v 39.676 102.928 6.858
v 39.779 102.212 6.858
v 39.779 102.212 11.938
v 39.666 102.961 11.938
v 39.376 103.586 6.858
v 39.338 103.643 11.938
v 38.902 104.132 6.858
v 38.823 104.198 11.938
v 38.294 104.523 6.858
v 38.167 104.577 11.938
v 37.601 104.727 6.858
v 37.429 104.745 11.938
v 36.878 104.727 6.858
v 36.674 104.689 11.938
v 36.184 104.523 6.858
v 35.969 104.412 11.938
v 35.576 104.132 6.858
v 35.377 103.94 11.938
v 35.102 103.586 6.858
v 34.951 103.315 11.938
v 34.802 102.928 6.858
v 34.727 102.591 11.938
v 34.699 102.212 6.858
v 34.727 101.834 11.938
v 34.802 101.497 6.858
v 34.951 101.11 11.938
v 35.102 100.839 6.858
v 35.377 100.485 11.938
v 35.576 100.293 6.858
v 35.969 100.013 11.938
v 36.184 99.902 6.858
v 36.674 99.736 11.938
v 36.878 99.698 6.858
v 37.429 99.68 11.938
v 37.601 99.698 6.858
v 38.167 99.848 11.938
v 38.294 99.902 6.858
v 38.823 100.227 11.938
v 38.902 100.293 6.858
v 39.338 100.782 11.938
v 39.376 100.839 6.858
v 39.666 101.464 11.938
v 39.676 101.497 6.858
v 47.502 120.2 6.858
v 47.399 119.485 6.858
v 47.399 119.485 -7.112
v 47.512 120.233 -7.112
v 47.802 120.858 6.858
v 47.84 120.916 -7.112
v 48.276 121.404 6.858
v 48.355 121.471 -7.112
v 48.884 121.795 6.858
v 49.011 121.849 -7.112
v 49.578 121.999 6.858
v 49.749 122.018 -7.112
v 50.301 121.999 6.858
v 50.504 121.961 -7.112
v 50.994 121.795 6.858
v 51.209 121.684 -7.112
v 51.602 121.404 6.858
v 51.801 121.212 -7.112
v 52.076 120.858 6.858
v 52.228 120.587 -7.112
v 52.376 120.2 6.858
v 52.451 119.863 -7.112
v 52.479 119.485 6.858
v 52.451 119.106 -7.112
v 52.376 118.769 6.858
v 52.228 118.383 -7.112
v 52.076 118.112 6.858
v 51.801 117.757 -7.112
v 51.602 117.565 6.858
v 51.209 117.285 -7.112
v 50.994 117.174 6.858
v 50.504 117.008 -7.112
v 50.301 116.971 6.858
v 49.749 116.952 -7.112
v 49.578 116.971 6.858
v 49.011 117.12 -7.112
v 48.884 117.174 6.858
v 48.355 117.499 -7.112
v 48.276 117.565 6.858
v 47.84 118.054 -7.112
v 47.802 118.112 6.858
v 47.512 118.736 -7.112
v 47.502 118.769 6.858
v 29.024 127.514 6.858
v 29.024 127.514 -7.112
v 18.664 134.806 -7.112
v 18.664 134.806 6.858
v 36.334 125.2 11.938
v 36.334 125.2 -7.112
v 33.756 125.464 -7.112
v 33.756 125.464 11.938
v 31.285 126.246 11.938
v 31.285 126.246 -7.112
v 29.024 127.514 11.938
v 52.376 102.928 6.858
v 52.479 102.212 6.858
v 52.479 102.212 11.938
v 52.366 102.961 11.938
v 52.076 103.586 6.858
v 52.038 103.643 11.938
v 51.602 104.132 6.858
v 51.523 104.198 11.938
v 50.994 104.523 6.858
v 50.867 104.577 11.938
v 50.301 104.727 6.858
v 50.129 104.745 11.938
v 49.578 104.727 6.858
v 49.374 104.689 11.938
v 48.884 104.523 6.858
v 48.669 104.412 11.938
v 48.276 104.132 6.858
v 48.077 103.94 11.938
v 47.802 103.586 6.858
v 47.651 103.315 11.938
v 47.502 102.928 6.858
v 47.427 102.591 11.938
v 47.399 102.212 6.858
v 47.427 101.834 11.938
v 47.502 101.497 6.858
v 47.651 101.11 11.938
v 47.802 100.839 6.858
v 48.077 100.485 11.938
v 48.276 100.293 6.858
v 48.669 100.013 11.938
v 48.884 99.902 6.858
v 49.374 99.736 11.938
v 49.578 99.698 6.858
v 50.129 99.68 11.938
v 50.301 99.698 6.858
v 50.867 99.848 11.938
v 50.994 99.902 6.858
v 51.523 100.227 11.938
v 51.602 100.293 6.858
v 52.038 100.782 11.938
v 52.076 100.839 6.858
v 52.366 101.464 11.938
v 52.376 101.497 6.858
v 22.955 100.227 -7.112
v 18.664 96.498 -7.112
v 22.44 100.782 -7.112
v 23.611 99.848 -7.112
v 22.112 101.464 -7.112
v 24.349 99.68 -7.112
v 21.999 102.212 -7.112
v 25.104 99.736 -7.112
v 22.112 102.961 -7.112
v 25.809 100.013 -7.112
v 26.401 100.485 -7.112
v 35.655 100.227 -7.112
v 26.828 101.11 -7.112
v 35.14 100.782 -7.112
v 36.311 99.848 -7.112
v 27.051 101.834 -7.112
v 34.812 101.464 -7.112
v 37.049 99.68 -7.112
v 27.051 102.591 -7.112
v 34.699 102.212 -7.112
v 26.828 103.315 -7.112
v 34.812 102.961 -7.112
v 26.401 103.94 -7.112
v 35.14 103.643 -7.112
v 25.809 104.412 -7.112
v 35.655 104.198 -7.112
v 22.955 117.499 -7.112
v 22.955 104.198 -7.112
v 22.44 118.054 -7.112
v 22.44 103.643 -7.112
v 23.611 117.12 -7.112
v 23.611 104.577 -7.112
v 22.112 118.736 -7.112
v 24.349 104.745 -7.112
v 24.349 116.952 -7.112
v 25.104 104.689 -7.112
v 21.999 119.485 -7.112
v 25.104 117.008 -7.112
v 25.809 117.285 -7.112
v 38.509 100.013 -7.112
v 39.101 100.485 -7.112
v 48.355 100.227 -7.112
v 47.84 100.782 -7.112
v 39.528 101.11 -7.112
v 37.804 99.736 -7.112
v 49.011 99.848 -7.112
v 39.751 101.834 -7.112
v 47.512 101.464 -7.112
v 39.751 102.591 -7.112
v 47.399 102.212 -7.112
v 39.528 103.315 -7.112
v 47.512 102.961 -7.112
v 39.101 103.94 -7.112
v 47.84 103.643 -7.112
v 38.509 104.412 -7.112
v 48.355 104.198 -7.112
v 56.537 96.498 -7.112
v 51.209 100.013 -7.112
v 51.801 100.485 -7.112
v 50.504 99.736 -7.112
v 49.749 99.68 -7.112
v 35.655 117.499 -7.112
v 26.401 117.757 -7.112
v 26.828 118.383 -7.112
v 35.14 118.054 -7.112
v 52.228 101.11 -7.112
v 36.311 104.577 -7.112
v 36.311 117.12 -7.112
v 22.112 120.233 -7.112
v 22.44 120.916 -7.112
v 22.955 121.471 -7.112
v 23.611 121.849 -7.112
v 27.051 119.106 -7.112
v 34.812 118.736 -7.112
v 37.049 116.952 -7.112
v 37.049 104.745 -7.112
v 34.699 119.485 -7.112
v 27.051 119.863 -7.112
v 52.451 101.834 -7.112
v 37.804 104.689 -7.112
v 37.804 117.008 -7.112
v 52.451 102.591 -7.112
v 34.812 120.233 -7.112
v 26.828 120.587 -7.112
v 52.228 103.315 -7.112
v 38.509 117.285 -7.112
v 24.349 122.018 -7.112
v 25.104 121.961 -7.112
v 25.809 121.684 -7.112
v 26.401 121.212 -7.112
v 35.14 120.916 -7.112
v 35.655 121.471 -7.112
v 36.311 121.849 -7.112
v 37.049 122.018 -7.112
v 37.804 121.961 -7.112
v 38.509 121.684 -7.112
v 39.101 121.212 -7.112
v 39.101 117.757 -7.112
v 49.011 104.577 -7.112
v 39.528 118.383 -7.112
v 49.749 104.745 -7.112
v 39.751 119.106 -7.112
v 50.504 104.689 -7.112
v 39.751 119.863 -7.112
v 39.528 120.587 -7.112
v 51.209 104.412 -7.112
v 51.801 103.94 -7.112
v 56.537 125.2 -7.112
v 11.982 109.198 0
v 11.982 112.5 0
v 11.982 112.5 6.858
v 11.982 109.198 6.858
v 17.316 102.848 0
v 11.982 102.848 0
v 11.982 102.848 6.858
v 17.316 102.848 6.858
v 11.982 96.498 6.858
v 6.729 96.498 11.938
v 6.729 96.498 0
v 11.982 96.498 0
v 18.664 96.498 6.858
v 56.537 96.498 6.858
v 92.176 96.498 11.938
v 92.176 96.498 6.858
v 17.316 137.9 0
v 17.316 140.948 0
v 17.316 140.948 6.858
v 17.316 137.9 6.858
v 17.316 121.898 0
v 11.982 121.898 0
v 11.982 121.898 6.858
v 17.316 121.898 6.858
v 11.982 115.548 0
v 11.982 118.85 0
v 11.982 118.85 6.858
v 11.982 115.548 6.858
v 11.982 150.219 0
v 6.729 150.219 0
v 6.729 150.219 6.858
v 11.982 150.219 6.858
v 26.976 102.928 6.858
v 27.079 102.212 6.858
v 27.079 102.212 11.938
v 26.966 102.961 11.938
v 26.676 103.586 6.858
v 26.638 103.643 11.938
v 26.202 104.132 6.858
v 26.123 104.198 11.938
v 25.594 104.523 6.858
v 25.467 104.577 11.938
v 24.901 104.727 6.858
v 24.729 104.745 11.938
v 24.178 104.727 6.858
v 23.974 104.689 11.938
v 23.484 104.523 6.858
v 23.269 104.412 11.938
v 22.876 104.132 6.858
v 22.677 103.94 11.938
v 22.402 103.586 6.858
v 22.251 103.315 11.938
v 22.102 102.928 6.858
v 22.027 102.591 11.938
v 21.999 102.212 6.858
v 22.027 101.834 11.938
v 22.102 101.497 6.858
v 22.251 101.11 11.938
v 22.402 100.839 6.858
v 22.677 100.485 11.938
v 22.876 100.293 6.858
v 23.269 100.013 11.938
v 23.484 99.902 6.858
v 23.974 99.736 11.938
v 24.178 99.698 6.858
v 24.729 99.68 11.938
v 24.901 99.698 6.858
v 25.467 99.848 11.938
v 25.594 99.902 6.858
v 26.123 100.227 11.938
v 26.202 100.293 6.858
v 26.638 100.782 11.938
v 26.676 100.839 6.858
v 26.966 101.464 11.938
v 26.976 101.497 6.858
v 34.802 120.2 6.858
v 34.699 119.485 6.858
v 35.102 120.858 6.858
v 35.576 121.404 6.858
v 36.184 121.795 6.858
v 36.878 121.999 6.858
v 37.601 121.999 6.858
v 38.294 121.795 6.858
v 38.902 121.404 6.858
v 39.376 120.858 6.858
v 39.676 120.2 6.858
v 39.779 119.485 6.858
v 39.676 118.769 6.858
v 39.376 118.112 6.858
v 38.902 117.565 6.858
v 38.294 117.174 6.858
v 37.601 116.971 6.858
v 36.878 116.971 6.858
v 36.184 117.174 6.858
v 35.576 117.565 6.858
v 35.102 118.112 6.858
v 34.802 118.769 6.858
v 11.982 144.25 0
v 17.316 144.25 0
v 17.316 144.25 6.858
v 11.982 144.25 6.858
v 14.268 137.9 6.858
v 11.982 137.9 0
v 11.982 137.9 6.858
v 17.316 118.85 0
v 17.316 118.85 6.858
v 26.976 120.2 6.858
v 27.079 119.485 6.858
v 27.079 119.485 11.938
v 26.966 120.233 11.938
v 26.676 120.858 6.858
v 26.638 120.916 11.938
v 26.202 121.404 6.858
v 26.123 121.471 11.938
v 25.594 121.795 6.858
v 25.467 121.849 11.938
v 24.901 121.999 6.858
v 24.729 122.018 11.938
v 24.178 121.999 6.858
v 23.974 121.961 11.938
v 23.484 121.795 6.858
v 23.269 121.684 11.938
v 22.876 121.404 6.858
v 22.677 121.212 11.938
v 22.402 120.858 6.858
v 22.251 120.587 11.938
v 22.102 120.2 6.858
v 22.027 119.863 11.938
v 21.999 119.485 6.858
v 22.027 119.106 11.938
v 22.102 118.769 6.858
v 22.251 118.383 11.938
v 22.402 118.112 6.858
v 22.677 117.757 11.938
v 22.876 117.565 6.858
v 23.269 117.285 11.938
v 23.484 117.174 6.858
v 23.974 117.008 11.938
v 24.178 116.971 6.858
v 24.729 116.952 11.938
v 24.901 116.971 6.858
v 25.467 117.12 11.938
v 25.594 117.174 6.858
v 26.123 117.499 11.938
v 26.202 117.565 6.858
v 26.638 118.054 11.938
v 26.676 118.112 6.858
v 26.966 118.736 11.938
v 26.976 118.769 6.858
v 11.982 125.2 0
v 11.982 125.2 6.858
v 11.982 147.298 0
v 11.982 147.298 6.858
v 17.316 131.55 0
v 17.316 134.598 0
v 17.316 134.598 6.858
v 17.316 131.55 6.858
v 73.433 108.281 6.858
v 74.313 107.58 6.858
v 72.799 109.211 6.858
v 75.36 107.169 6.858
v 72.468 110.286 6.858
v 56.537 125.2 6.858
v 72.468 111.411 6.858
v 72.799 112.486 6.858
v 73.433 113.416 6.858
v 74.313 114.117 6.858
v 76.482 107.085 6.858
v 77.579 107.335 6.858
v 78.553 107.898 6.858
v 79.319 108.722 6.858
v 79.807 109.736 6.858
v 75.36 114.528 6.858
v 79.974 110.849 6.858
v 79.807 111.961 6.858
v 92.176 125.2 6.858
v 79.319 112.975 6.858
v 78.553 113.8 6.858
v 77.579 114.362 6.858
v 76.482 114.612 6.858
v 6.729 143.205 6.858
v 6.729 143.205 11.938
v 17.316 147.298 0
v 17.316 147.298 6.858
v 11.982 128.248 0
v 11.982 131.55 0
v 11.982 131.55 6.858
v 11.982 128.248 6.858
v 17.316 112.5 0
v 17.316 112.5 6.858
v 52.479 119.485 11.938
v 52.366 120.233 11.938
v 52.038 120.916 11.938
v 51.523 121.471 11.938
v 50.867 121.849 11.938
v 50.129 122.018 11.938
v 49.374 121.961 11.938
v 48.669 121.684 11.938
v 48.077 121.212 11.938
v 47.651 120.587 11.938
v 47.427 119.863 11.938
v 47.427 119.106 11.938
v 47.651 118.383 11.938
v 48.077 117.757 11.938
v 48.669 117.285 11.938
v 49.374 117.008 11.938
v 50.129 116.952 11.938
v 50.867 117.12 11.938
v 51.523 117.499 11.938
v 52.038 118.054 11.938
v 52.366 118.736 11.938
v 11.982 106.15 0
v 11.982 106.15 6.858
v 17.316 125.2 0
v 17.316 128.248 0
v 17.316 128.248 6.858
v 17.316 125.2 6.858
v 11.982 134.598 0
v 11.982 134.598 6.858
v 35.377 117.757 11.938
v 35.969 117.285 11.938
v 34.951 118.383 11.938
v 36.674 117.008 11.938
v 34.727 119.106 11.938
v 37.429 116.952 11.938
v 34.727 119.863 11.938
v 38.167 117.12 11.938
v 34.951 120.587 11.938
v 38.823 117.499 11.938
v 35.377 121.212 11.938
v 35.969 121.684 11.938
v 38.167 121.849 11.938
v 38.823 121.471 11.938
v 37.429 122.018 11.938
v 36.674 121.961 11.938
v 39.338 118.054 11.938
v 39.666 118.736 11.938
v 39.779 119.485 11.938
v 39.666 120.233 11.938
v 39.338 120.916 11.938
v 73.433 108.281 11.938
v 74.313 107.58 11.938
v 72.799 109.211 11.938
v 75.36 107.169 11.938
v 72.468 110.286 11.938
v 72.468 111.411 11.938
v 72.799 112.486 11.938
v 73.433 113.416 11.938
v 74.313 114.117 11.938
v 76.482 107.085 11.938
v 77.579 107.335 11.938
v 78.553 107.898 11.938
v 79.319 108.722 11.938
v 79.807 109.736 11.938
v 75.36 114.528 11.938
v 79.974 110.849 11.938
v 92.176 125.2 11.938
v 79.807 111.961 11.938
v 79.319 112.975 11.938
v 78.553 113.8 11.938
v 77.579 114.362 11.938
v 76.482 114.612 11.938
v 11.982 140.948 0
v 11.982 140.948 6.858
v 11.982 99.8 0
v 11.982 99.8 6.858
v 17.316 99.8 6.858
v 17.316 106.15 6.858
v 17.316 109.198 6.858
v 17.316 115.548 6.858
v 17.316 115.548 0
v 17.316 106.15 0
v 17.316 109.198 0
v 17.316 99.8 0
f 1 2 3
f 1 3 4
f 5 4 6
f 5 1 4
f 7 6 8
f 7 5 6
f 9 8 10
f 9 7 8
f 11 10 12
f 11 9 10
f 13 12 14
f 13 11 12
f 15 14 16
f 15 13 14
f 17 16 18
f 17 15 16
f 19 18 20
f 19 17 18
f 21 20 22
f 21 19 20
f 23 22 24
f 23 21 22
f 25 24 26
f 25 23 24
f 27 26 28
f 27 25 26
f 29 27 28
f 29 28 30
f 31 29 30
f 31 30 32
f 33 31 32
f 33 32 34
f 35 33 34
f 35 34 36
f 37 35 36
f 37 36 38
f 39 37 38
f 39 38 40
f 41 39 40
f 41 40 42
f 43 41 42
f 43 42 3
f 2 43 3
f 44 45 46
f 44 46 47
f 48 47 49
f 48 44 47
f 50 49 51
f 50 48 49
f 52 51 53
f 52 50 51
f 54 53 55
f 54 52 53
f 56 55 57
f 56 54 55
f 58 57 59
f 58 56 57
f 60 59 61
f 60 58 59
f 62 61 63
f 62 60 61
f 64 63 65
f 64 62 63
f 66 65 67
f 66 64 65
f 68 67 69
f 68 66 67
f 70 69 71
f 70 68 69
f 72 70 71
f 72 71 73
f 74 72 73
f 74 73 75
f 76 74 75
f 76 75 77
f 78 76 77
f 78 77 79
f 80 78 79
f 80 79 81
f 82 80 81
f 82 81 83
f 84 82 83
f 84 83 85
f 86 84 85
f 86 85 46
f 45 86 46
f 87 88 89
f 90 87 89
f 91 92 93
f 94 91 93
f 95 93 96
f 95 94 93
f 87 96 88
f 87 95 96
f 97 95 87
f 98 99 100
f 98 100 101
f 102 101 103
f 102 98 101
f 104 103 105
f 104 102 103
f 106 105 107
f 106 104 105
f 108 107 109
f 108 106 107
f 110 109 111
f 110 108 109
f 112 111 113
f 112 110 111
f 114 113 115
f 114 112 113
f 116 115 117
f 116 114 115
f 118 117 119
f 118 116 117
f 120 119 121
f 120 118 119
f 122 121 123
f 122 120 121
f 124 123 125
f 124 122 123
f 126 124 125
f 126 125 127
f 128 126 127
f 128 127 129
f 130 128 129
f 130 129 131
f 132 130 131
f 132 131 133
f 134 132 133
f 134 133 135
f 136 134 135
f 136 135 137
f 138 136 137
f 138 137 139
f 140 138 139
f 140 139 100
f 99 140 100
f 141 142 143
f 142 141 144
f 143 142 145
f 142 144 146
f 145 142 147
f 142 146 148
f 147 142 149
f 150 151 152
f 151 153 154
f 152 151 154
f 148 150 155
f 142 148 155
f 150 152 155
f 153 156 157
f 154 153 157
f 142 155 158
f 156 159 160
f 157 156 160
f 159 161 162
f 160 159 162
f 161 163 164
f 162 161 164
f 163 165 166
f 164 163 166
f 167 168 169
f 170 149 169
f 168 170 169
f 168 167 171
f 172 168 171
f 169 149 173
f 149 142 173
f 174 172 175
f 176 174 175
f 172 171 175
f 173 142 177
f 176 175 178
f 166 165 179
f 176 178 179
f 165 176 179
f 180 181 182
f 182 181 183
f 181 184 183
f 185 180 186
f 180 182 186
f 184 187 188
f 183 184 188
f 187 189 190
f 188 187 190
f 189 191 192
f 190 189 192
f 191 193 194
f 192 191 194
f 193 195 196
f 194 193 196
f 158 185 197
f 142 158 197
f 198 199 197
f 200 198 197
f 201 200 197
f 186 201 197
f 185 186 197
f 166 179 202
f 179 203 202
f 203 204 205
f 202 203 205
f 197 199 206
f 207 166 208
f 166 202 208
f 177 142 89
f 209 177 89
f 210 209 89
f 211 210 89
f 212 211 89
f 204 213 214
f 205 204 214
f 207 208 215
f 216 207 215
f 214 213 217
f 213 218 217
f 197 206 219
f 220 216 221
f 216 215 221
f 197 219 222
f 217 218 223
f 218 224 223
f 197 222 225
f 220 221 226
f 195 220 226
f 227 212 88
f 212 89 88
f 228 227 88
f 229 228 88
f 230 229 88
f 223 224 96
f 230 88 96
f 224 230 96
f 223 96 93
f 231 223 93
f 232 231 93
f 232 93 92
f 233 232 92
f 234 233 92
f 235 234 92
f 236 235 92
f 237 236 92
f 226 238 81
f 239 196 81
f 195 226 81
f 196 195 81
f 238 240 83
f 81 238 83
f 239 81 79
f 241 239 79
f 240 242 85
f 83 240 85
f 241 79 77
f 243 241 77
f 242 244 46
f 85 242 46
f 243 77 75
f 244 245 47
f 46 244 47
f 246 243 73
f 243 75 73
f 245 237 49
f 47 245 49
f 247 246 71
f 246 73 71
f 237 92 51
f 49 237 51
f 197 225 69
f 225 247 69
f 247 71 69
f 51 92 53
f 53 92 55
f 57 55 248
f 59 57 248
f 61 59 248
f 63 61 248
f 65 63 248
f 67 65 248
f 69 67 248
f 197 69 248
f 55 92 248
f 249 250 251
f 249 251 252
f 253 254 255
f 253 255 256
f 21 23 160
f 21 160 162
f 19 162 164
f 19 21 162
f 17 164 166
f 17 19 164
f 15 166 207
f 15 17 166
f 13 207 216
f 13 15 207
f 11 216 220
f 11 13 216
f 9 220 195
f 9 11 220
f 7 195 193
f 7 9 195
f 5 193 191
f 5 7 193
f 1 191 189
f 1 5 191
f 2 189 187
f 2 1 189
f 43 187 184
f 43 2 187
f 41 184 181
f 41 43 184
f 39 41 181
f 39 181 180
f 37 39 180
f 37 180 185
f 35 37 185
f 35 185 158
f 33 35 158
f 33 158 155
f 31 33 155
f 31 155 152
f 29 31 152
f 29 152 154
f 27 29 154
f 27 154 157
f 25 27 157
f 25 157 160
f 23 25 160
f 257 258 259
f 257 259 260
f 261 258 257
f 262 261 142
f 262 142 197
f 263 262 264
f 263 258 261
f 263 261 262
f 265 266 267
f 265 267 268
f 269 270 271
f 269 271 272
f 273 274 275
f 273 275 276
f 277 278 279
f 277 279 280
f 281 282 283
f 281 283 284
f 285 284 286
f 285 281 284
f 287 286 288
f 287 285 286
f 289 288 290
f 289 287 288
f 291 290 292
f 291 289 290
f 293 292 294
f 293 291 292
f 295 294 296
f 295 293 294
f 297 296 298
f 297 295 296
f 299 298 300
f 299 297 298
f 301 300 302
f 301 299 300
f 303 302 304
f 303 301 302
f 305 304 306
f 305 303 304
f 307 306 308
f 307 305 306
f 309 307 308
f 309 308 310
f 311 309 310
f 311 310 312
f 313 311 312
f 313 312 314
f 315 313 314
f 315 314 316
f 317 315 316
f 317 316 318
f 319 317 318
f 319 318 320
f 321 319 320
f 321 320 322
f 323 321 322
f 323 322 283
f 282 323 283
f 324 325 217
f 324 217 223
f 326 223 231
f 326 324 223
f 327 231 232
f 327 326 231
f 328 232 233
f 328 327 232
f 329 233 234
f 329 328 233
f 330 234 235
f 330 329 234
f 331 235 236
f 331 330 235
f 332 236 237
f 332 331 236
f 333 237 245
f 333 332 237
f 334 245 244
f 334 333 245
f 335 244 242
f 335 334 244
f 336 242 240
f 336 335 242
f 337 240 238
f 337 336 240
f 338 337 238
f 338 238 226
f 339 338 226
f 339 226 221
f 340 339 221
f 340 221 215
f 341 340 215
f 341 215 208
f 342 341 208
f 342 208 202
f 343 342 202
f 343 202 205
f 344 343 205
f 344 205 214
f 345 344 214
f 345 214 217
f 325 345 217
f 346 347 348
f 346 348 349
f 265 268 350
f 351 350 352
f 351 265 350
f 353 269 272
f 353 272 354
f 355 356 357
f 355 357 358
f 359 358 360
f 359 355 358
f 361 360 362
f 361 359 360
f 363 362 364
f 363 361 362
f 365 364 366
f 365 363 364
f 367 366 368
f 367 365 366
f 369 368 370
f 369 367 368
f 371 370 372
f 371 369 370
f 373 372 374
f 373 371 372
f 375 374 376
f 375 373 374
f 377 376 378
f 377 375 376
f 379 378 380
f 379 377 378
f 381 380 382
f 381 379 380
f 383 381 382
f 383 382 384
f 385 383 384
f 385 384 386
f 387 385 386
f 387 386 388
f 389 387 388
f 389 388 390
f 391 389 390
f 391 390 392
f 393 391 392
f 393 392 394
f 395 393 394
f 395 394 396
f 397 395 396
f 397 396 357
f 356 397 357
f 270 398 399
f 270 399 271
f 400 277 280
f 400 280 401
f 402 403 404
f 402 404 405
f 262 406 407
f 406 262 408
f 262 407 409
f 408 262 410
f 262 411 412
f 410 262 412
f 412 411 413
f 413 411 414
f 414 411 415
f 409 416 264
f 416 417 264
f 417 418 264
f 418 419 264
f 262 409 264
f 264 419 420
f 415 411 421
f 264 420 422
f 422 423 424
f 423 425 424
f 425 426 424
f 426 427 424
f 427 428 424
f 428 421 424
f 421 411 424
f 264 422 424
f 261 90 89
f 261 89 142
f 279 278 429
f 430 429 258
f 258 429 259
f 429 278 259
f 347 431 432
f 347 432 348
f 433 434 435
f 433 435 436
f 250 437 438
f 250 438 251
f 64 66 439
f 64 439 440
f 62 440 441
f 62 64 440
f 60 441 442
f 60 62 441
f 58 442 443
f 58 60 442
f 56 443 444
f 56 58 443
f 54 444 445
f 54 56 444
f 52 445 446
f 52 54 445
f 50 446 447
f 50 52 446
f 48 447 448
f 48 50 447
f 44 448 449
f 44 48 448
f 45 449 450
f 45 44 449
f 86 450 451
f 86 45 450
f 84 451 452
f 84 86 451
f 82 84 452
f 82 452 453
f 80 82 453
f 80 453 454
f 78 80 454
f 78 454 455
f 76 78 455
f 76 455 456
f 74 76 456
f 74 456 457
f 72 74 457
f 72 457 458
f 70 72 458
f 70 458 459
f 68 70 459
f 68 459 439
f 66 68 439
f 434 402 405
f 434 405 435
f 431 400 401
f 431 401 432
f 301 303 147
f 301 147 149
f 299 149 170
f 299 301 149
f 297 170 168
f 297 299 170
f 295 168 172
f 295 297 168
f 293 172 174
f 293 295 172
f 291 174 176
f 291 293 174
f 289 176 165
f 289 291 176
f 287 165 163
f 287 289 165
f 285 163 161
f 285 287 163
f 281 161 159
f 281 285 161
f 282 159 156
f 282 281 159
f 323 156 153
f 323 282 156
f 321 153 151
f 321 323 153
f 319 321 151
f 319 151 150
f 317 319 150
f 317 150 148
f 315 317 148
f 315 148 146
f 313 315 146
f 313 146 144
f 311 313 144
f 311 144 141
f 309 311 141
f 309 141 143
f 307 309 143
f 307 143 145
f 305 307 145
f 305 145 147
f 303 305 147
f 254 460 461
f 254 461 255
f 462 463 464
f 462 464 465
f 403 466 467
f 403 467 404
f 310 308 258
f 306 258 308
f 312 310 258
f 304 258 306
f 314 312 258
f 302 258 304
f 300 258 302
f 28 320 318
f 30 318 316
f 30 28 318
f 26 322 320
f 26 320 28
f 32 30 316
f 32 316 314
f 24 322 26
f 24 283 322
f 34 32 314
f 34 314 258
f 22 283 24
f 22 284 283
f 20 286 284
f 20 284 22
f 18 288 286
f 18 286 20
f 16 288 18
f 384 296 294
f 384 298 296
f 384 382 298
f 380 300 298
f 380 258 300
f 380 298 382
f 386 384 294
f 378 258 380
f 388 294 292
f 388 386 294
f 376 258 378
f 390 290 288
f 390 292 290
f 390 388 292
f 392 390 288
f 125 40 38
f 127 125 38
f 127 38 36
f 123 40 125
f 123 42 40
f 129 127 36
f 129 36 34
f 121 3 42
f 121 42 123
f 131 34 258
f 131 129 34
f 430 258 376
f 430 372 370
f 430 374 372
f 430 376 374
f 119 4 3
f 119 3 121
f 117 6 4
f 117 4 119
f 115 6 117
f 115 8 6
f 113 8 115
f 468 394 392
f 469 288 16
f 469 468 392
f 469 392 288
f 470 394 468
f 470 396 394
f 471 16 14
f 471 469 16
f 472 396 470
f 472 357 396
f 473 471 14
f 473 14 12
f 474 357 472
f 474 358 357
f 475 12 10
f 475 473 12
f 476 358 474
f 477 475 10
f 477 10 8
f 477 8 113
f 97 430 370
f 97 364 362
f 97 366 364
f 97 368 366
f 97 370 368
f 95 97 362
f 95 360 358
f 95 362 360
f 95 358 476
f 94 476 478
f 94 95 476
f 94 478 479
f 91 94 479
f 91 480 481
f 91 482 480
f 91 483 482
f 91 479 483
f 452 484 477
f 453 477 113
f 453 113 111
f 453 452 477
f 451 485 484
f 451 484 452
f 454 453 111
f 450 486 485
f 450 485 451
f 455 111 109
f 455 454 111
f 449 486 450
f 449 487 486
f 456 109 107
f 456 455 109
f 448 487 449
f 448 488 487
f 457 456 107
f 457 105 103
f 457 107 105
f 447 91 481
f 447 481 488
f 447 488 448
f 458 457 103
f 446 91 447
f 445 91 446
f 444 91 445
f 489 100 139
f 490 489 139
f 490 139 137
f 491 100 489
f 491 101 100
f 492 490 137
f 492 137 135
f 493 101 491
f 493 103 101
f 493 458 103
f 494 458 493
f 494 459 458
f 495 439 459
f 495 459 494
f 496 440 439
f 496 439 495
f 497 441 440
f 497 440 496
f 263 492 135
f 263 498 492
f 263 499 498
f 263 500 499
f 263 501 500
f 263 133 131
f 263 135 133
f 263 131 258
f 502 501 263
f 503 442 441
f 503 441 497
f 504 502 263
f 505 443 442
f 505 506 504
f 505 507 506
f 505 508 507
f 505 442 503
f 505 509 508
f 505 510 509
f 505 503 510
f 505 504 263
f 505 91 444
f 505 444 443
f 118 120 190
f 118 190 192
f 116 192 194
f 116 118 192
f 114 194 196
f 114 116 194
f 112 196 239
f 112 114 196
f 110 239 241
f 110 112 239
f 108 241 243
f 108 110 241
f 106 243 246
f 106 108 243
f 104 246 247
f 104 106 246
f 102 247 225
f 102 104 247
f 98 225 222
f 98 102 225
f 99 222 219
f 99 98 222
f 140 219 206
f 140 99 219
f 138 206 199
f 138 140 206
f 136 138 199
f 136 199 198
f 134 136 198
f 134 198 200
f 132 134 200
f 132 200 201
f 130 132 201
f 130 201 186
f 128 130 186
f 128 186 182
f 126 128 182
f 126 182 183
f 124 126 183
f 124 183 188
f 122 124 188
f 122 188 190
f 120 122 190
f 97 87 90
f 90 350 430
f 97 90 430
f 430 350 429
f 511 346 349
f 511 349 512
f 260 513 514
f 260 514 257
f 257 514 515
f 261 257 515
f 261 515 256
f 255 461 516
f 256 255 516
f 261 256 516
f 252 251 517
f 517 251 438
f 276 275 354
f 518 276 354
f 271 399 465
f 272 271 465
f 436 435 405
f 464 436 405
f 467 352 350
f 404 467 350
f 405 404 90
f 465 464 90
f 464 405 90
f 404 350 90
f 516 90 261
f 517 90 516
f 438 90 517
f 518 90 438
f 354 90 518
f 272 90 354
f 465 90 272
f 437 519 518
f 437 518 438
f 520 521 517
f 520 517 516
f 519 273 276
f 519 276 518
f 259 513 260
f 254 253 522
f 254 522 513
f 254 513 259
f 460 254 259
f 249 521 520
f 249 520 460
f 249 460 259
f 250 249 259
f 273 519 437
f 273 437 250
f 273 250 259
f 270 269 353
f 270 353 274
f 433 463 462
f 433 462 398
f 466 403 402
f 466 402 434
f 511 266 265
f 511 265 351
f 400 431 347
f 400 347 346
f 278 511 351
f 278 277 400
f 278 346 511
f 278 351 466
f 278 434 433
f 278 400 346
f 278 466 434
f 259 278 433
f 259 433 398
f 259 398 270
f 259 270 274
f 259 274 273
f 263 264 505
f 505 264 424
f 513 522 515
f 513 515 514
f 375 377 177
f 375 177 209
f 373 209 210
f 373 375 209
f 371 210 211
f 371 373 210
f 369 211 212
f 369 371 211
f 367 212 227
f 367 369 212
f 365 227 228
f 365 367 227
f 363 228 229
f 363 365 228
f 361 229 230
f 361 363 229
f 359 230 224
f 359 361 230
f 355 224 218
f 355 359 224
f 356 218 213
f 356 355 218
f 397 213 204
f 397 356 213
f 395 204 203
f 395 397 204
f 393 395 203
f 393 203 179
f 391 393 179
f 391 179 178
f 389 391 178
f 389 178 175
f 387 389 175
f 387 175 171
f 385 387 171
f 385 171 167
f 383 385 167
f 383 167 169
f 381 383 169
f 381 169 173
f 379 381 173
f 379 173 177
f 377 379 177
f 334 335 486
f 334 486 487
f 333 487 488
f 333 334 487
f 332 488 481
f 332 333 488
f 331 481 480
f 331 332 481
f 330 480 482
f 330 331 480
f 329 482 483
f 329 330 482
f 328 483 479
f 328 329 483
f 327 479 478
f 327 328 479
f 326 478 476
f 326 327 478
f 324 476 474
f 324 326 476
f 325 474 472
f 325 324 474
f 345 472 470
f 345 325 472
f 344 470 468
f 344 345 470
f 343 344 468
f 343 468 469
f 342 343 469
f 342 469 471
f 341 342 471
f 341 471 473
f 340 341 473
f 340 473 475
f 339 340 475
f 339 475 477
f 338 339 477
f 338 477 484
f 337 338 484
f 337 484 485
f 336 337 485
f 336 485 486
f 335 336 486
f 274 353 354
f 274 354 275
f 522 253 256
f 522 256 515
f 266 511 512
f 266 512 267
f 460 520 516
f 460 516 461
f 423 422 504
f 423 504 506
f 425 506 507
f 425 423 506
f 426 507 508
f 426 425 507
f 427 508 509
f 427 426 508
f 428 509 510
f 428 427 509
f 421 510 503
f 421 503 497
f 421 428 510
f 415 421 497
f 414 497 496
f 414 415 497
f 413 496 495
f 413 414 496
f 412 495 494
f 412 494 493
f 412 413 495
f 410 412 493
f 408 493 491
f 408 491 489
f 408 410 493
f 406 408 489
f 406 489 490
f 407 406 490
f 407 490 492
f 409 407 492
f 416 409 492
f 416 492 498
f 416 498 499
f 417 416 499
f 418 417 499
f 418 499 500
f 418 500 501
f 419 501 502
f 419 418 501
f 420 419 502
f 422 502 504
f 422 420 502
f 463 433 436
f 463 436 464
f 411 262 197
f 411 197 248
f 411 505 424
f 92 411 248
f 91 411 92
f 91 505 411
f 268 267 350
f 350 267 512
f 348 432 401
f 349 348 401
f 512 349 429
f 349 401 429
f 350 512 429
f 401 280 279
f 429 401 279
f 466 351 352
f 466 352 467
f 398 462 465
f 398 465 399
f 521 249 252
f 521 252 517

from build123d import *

# Parameters (mm, degrees)
BOSS_EXTRUDE1_DEPTH = 6.858
SKETCH3_R           = 2.54
SKETCH3_R_2         = 3.77436477
BOSS_EXTRUDE2_DEPTH = 5.08
SKETCH4_R           = 2.54
BOSS_EXTRUDE3_DEPTH = 13.97


with BuildPart() as part:
    # Sketch2 → Boss-Extrude1 (new body)
    with BuildSketch(Plane.XY):
        Polygon((11.982344641, 125.199618103), (11.982344641, 121.897618103), (17.316344641, 121.897618103), (17.316344641, 118.849618103), (11.982344641, 118.849618103), (11.982344641, 115.547618103), (17.316344641, 115.547618103), (17.316344641, 112.499618103), (11.982344641, 112.499618103), (11.982344641, 109.197618103), (17.316344641, 109.197618103), (17.316344641, 106.149618103), (11.982344641, 106.149618103), (11.982344641, 102.847618103), (17.316344641, 102.847618103), (17.316344641, 99.799618103), (11.982344641, 99.799618103), (11.982344641, 96.497618103), (6.729436841, 96.497618103), (6.729436841, 125.199618103), (6.729436841, 150.218618103), (11.982344641, 150.218618103), (11.982344641, 147.297618103), (17.316344641, 147.297618103), (17.316344641, 144.249618103), (11.982344641, 144.249618103), (11.982344641, 140.947618103), (17.316344641, 140.947618103), (17.316344641, 137.899618103), (11.982344641, 137.899618103), (11.982344641, 134.597618103), (17.316344641, 134.597618103), (17.316344641, 131.549618103), (11.982344641, 131.549618103), (11.982344641, 128.247618103), (17.316344641, 128.247618103), (17.316344641, 125.199618103), align=None)
    extrude(amount=BOSS_EXTRUDE1_DEPTH)

    # Sketch3 → Boss-Extrude2 (add)
    with BuildSketch(Plane.XY.offset(6.858)):
        with BuildLine():
            Line((6.729436841, 125.199618103), (6.729436841, 96.497618103))
            Line((6.729436841, 96.497618103), (16.3439883, 96.497618103))
            Line((16.3439883, 96.497618103), (32.312638487, 96.497618103))
            Line((32.312638487, 96.497618103), (78.23353946, 96.497618103))
            Line((78.23353946, 96.497618103), (92.175808331, 96.497618103))
            Line((92.175808331, 96.497618103), (92.175808331, 125.199618103))
            Line((92.175808331, 125.199618103), (78.23353946, 125.199618103))
            Line((78.23353946, 125.199618103), (36.33380561, 125.199618103))
            ThreePointArc((36.33380561, 125.199618103), (32.5002138, 125.792034783), (29.024272972, 127.514015924))
            Line((29.024272972, 127.514015924), (6.729436841, 143.205434636))
            Line((6.729436841, 143.205434636), (6.729436841, 125.199618103))
        make_face()
        with Locations((24.539097495, 102.212466287)):
            Circle(SKETCH3_R, mode=Mode.SUBTRACT)
        with Locations((76.2, 110.848618103)):
            Circle(SKETCH3_R_2, mode=Mode.SUBTRACT)
        with Locations((24.539097495, 119.484769918)):
            Circle(SKETCH3_R, mode=Mode.SUBTRACT)
        with Locations((37.239097495, 119.484769918)):
            Circle(SKETCH3_R, mode=Mode.SUBTRACT)
        with Locations((37.239097495, 102.212466287)):
            Circle(SKETCH3_R, mode=Mode.SUBTRACT)
        with Locations((49.939097495, 119.484769918)):
            Circle(SKETCH3_R, mode=Mode.SUBTRACT)
        with Locations((49.939097495, 102.212466287)):
            Circle(SKETCH3_R, mode=Mode.SUBTRACT)
    extrude(amount=BOSS_EXTRUDE2_DEPTH)

    # Sketch4 → Boss-Extrude3 (add)
    with BuildSketch(Plane(origin=(0, 0, 6.858), x_dir=(-1, 0, 0), z_dir=(0, 0, -1))):
        with BuildLine():
            Line((-29.024272972, 127.514015924), (-18.664038362, 134.805694511))
            Line((-18.664038362, 134.805694511), (-18.664038362, 96.497618103))
            Line((-18.664038362, 96.497618103), (-56.536837783, 96.497618103))
            Line((-56.536837783, 96.497618103), (-56.536837783, 125.199618103))
            Line((-56.536837783, 125.199618103), (-36.33380561, 125.199618103))
            ThreePointArc((-36.33380561, 125.199618103), (-32.5002138, 125.792034783), (-29.024272972, 127.514015924))
        make_face()
        with Locations((-49.939097495, 102.212466287)):
            Circle(SKETCH4_R, mode=Mode.SUBTRACT)
        with Locations((-37.239097495, 102.212466287)):
            Circle(SKETCH4_R, mode=Mode.SUBTRACT)
        with Locations((-24.539097495, 102.212466287)):
            Circle(SKETCH4_R, mode=Mode.SUBTRACT)
        with Locations((-24.539097495, 119.484769918)):
            Circle(SKETCH4_R, mode=Mode.SUBTRACT)
        with Locations((-37.239097495, 119.484769918)):
            Circle(SKETCH4_R, mode=Mode.SUBTRACT)
        with Locations((-49.939097495, 119.484769918)):
            Circle(SKETCH4_R, mode=Mode.SUBTRACT)
    extrude(amount=BOSS_EXTRUDE3_DEPTH)


solid = part.part
